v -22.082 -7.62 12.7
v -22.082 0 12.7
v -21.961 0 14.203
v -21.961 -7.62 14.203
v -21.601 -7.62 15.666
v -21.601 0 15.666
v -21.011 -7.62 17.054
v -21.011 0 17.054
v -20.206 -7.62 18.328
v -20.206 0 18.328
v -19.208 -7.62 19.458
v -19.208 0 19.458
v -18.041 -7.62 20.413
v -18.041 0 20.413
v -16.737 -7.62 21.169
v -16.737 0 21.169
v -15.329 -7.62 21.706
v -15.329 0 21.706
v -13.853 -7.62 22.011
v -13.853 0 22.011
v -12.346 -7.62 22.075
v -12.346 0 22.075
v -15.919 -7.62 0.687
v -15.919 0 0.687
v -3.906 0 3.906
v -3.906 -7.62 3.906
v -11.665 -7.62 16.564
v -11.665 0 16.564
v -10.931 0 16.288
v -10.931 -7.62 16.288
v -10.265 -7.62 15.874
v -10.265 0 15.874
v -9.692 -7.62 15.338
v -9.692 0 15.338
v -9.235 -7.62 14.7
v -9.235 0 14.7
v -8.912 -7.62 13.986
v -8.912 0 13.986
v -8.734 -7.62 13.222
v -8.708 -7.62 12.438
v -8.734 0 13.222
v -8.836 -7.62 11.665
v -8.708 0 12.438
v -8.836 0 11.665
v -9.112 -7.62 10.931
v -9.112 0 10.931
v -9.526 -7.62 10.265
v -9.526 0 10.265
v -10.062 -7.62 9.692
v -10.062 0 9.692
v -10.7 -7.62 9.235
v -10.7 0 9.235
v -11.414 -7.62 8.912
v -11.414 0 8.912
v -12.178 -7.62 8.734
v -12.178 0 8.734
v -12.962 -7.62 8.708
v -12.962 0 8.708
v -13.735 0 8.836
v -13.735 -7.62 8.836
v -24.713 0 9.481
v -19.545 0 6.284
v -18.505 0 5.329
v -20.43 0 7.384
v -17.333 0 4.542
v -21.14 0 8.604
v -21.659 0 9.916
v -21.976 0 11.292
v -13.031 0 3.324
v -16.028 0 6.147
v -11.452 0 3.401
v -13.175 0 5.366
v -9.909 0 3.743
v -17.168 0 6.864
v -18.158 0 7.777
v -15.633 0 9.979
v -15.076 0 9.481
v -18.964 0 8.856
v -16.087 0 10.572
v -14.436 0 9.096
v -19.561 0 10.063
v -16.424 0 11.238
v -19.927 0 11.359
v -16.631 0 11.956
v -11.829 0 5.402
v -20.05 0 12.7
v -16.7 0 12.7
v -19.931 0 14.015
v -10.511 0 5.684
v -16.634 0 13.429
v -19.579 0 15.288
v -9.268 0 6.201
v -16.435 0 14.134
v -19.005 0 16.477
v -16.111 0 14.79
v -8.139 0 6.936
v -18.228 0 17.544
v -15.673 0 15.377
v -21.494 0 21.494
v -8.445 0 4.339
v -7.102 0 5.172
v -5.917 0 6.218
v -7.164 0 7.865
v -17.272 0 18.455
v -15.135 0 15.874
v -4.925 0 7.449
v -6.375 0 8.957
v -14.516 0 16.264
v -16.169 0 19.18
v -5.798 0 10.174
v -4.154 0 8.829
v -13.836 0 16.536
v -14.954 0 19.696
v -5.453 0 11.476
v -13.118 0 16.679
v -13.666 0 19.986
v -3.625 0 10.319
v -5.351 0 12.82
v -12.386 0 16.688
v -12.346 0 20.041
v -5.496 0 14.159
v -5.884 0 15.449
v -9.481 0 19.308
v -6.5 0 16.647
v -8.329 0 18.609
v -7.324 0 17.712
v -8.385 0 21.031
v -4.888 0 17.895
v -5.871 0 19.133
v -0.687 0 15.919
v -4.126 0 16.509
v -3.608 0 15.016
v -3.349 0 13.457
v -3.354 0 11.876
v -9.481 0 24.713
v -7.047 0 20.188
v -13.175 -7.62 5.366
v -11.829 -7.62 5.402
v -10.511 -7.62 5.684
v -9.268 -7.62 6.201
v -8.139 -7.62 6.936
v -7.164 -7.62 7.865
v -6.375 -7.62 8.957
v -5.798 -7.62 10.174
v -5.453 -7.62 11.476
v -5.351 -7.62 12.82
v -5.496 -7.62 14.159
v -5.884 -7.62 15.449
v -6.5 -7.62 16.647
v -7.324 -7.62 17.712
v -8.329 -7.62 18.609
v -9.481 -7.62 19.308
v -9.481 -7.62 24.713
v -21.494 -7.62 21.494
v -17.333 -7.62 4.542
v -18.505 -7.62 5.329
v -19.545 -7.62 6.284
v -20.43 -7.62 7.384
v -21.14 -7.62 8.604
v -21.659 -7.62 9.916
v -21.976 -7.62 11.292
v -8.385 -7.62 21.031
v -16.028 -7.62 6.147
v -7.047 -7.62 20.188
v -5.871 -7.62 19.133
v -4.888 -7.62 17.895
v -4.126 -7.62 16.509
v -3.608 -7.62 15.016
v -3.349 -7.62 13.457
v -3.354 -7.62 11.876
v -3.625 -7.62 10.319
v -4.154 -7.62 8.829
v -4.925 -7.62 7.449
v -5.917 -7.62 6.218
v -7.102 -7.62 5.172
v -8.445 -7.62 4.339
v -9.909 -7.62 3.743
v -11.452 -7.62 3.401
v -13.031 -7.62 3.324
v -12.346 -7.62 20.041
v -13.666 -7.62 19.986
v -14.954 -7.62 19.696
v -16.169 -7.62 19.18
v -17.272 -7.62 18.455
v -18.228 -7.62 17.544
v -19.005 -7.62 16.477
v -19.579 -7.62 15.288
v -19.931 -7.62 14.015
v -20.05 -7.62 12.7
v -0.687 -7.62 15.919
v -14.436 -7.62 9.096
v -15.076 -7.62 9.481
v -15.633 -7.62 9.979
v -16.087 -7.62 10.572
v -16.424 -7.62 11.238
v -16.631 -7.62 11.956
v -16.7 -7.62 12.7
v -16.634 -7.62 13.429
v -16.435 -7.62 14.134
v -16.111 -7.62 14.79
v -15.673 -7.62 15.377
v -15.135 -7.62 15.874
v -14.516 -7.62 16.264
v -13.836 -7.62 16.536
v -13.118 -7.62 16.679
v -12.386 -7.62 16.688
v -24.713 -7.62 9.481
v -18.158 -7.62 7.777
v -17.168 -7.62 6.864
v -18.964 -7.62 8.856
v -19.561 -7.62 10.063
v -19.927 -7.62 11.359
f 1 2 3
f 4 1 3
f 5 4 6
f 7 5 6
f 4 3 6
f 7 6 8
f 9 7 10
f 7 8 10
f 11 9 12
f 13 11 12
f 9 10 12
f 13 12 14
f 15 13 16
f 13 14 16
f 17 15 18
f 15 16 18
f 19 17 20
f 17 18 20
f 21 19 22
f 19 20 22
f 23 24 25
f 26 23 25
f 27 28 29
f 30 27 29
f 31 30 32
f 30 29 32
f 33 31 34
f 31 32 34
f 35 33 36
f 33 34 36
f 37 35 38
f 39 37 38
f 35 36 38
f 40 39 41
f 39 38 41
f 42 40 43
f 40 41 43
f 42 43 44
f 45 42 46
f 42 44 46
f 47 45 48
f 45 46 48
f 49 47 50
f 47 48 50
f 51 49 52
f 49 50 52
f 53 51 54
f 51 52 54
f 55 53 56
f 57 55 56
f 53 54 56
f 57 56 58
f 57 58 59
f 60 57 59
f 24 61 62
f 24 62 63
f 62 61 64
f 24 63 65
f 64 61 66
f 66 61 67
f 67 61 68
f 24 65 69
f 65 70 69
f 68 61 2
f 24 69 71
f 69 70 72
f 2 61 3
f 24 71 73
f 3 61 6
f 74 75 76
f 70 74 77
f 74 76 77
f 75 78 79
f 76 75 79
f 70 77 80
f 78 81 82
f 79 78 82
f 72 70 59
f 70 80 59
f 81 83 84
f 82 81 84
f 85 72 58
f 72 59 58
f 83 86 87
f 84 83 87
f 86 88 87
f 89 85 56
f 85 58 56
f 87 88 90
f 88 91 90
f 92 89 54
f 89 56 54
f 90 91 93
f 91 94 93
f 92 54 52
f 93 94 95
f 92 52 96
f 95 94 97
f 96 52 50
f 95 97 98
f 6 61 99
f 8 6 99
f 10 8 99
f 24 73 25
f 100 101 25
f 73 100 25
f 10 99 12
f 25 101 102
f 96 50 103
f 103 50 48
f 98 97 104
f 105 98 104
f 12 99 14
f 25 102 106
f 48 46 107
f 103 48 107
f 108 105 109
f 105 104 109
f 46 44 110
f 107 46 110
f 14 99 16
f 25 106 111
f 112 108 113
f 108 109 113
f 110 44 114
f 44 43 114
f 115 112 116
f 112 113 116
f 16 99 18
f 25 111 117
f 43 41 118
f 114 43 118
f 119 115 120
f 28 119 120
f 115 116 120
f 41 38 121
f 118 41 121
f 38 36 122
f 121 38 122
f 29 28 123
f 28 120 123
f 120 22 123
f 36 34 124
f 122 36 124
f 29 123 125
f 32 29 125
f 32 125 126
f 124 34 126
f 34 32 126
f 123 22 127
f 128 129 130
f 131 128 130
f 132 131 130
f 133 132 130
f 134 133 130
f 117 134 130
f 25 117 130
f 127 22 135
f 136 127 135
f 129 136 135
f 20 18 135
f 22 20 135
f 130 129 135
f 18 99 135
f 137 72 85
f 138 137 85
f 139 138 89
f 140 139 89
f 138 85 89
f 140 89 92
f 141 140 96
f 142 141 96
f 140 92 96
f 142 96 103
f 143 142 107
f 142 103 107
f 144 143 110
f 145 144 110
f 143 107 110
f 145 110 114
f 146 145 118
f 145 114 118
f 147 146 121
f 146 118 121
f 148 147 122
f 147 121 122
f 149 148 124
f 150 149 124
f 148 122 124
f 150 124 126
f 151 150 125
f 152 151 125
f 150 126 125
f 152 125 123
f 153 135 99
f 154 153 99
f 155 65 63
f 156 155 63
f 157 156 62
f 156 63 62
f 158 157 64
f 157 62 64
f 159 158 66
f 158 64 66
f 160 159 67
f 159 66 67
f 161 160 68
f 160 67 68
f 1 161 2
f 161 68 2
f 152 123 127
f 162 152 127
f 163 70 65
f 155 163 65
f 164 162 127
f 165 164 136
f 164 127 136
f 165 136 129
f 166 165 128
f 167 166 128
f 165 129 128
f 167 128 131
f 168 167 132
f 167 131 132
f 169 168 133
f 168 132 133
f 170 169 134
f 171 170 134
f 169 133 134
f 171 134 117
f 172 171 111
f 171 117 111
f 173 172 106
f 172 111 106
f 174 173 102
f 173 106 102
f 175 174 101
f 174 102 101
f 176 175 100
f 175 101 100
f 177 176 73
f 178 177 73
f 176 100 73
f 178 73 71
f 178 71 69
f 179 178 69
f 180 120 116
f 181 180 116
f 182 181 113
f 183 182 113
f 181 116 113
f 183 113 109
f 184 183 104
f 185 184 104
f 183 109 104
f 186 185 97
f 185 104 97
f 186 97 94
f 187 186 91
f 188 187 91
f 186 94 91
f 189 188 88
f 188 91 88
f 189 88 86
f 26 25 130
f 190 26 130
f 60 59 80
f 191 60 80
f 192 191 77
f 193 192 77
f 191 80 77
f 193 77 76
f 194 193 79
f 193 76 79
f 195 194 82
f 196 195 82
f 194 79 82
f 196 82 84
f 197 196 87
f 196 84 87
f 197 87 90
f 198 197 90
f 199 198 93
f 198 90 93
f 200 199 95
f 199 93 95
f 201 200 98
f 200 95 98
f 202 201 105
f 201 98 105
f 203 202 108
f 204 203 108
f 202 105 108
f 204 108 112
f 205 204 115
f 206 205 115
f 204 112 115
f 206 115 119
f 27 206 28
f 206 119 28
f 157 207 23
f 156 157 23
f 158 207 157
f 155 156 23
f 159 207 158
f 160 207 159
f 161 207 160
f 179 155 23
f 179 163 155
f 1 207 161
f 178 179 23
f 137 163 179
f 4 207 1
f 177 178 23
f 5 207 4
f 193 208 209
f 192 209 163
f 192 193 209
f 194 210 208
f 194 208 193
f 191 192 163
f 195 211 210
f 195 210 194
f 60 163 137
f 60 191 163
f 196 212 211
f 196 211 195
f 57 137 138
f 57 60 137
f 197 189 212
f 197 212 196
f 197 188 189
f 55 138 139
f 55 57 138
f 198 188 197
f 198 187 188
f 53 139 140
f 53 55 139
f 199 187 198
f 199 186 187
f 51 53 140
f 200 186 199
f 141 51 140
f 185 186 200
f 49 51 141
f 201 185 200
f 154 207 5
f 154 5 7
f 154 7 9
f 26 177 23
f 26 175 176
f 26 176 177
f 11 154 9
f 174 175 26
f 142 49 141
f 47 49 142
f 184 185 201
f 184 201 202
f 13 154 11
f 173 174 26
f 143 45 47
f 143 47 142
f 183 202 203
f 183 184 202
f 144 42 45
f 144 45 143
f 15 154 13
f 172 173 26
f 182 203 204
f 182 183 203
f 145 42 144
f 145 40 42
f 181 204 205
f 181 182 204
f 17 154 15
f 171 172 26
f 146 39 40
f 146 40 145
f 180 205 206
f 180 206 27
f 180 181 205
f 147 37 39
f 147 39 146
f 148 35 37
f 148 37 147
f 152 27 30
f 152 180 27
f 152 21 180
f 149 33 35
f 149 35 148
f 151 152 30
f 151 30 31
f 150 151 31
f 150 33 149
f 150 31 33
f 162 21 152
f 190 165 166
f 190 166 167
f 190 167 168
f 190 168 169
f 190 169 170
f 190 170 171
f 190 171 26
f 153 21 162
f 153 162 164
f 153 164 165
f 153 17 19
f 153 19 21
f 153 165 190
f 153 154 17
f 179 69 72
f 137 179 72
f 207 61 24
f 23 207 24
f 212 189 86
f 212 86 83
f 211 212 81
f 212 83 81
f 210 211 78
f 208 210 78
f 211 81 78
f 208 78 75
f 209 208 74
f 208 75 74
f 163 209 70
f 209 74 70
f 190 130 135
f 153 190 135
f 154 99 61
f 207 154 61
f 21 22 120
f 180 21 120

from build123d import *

# Parameters (mm, degrees)
F1_DEPTH = 7.62
F3_DEPTH = 7.62
F5_DEPTH = 7.62


with BuildPart() as f1:
    # F0 (on Front) → F1 (new body)
    with BuildSketch(Plane.XZ):
        Polygon((-0.68674681, 15.9189414907), (-9.4810585093, 24.71325319), (-21.4943116993, 21.4943116993), (-24.71325319, 9.4810585093), (-15.9189414907, 0.68674681), (-3.9056883007, 3.9056883007), align=None)
    extrude(amount=F1_DEPTH)

    # F2 (on face) → F3 (cut)
    with BuildSketch(Plane(origin=(0, 0, 0), x_dir=(-1, 0, 0), z_dir=(0, 1, 0))):
        with BuildLine():
            Line((13.7354055899, 8.8358137319), (11.6645944101, 16.5641862681))
            ThreePointArc((11.6645944101, 16.5641862681), (8.8358137319, 11.6645944101), (13.7354055899, 8.8358137319))
        make_face()
        with BuildLine():
            ThreePointArc((16.7005, 12.7), (15.1353500967, 15.8738100378), (11.6645944101, 16.5641862681))
            Line((11.6645944101, 16.5641862681), (13.7354055899, 8.8358137319))
            ThreePointArc((13.7354055899, 8.8358137319), (15.8738100378, 10.2646499033), (16.7005, 12.7))
        make_face()
    extrude(amount=-F3_DEPTH, mode=Mode.SUBTRACT)

    # F4 (on face) → F5 (cut)
    with BuildSketch(Plane(origin=(0, 0, 0), x_dir=(-1, 0, 0), z_dir=(0, 1, 0))):
        with BuildLine():
            Line((9.4810585093, 19.3075097995), (8.38471647, 21.0305488332))
            ThreePointArc((8.38471647, 21.0305488332), (3.6253777463, 10.3186250274), (13.0313017042, 3.323969124))
            Line((13.0313017042, 3.323969124), (13.1753263628, 5.3655037719))
            ThreePointArc((13.1753263628, 5.3655037719), (5.5953016242, 10.8174402904), (9.4810585093, 19.3075097995))
        make_face()
        with BuildLine():
            ThreePointArc((17.3331181487, 4.5419406703), (20.808239175, 7.9802358864), (22.0818823168, 12.7))
            ThreePointArc((22.0818823168, 12.7), (19.2078073532, 19.4578220797), (12.3464885615, 22.0752197558))
            Line((12.3464885615, 22.0752197558), (12.3464885615, 20.0413758747))
            ThreePointArc((12.3464885615, 20.0413758747), (17.7706263223, 18.0206690154), (20.0498823168, 12.7))
            ThreePointArc((20.0498823168, 12.7), (18.9642836617, 8.8555858343), (16.0281797534, 6.1468336203))
            Line((16.0281797534, 6.1468336203), (17.3331181487, 4.5419406703))
        make_face()
    extrude(amount=-F5_DEPTH, mode=Mode.SUBTRACT)


solid = f1.part
